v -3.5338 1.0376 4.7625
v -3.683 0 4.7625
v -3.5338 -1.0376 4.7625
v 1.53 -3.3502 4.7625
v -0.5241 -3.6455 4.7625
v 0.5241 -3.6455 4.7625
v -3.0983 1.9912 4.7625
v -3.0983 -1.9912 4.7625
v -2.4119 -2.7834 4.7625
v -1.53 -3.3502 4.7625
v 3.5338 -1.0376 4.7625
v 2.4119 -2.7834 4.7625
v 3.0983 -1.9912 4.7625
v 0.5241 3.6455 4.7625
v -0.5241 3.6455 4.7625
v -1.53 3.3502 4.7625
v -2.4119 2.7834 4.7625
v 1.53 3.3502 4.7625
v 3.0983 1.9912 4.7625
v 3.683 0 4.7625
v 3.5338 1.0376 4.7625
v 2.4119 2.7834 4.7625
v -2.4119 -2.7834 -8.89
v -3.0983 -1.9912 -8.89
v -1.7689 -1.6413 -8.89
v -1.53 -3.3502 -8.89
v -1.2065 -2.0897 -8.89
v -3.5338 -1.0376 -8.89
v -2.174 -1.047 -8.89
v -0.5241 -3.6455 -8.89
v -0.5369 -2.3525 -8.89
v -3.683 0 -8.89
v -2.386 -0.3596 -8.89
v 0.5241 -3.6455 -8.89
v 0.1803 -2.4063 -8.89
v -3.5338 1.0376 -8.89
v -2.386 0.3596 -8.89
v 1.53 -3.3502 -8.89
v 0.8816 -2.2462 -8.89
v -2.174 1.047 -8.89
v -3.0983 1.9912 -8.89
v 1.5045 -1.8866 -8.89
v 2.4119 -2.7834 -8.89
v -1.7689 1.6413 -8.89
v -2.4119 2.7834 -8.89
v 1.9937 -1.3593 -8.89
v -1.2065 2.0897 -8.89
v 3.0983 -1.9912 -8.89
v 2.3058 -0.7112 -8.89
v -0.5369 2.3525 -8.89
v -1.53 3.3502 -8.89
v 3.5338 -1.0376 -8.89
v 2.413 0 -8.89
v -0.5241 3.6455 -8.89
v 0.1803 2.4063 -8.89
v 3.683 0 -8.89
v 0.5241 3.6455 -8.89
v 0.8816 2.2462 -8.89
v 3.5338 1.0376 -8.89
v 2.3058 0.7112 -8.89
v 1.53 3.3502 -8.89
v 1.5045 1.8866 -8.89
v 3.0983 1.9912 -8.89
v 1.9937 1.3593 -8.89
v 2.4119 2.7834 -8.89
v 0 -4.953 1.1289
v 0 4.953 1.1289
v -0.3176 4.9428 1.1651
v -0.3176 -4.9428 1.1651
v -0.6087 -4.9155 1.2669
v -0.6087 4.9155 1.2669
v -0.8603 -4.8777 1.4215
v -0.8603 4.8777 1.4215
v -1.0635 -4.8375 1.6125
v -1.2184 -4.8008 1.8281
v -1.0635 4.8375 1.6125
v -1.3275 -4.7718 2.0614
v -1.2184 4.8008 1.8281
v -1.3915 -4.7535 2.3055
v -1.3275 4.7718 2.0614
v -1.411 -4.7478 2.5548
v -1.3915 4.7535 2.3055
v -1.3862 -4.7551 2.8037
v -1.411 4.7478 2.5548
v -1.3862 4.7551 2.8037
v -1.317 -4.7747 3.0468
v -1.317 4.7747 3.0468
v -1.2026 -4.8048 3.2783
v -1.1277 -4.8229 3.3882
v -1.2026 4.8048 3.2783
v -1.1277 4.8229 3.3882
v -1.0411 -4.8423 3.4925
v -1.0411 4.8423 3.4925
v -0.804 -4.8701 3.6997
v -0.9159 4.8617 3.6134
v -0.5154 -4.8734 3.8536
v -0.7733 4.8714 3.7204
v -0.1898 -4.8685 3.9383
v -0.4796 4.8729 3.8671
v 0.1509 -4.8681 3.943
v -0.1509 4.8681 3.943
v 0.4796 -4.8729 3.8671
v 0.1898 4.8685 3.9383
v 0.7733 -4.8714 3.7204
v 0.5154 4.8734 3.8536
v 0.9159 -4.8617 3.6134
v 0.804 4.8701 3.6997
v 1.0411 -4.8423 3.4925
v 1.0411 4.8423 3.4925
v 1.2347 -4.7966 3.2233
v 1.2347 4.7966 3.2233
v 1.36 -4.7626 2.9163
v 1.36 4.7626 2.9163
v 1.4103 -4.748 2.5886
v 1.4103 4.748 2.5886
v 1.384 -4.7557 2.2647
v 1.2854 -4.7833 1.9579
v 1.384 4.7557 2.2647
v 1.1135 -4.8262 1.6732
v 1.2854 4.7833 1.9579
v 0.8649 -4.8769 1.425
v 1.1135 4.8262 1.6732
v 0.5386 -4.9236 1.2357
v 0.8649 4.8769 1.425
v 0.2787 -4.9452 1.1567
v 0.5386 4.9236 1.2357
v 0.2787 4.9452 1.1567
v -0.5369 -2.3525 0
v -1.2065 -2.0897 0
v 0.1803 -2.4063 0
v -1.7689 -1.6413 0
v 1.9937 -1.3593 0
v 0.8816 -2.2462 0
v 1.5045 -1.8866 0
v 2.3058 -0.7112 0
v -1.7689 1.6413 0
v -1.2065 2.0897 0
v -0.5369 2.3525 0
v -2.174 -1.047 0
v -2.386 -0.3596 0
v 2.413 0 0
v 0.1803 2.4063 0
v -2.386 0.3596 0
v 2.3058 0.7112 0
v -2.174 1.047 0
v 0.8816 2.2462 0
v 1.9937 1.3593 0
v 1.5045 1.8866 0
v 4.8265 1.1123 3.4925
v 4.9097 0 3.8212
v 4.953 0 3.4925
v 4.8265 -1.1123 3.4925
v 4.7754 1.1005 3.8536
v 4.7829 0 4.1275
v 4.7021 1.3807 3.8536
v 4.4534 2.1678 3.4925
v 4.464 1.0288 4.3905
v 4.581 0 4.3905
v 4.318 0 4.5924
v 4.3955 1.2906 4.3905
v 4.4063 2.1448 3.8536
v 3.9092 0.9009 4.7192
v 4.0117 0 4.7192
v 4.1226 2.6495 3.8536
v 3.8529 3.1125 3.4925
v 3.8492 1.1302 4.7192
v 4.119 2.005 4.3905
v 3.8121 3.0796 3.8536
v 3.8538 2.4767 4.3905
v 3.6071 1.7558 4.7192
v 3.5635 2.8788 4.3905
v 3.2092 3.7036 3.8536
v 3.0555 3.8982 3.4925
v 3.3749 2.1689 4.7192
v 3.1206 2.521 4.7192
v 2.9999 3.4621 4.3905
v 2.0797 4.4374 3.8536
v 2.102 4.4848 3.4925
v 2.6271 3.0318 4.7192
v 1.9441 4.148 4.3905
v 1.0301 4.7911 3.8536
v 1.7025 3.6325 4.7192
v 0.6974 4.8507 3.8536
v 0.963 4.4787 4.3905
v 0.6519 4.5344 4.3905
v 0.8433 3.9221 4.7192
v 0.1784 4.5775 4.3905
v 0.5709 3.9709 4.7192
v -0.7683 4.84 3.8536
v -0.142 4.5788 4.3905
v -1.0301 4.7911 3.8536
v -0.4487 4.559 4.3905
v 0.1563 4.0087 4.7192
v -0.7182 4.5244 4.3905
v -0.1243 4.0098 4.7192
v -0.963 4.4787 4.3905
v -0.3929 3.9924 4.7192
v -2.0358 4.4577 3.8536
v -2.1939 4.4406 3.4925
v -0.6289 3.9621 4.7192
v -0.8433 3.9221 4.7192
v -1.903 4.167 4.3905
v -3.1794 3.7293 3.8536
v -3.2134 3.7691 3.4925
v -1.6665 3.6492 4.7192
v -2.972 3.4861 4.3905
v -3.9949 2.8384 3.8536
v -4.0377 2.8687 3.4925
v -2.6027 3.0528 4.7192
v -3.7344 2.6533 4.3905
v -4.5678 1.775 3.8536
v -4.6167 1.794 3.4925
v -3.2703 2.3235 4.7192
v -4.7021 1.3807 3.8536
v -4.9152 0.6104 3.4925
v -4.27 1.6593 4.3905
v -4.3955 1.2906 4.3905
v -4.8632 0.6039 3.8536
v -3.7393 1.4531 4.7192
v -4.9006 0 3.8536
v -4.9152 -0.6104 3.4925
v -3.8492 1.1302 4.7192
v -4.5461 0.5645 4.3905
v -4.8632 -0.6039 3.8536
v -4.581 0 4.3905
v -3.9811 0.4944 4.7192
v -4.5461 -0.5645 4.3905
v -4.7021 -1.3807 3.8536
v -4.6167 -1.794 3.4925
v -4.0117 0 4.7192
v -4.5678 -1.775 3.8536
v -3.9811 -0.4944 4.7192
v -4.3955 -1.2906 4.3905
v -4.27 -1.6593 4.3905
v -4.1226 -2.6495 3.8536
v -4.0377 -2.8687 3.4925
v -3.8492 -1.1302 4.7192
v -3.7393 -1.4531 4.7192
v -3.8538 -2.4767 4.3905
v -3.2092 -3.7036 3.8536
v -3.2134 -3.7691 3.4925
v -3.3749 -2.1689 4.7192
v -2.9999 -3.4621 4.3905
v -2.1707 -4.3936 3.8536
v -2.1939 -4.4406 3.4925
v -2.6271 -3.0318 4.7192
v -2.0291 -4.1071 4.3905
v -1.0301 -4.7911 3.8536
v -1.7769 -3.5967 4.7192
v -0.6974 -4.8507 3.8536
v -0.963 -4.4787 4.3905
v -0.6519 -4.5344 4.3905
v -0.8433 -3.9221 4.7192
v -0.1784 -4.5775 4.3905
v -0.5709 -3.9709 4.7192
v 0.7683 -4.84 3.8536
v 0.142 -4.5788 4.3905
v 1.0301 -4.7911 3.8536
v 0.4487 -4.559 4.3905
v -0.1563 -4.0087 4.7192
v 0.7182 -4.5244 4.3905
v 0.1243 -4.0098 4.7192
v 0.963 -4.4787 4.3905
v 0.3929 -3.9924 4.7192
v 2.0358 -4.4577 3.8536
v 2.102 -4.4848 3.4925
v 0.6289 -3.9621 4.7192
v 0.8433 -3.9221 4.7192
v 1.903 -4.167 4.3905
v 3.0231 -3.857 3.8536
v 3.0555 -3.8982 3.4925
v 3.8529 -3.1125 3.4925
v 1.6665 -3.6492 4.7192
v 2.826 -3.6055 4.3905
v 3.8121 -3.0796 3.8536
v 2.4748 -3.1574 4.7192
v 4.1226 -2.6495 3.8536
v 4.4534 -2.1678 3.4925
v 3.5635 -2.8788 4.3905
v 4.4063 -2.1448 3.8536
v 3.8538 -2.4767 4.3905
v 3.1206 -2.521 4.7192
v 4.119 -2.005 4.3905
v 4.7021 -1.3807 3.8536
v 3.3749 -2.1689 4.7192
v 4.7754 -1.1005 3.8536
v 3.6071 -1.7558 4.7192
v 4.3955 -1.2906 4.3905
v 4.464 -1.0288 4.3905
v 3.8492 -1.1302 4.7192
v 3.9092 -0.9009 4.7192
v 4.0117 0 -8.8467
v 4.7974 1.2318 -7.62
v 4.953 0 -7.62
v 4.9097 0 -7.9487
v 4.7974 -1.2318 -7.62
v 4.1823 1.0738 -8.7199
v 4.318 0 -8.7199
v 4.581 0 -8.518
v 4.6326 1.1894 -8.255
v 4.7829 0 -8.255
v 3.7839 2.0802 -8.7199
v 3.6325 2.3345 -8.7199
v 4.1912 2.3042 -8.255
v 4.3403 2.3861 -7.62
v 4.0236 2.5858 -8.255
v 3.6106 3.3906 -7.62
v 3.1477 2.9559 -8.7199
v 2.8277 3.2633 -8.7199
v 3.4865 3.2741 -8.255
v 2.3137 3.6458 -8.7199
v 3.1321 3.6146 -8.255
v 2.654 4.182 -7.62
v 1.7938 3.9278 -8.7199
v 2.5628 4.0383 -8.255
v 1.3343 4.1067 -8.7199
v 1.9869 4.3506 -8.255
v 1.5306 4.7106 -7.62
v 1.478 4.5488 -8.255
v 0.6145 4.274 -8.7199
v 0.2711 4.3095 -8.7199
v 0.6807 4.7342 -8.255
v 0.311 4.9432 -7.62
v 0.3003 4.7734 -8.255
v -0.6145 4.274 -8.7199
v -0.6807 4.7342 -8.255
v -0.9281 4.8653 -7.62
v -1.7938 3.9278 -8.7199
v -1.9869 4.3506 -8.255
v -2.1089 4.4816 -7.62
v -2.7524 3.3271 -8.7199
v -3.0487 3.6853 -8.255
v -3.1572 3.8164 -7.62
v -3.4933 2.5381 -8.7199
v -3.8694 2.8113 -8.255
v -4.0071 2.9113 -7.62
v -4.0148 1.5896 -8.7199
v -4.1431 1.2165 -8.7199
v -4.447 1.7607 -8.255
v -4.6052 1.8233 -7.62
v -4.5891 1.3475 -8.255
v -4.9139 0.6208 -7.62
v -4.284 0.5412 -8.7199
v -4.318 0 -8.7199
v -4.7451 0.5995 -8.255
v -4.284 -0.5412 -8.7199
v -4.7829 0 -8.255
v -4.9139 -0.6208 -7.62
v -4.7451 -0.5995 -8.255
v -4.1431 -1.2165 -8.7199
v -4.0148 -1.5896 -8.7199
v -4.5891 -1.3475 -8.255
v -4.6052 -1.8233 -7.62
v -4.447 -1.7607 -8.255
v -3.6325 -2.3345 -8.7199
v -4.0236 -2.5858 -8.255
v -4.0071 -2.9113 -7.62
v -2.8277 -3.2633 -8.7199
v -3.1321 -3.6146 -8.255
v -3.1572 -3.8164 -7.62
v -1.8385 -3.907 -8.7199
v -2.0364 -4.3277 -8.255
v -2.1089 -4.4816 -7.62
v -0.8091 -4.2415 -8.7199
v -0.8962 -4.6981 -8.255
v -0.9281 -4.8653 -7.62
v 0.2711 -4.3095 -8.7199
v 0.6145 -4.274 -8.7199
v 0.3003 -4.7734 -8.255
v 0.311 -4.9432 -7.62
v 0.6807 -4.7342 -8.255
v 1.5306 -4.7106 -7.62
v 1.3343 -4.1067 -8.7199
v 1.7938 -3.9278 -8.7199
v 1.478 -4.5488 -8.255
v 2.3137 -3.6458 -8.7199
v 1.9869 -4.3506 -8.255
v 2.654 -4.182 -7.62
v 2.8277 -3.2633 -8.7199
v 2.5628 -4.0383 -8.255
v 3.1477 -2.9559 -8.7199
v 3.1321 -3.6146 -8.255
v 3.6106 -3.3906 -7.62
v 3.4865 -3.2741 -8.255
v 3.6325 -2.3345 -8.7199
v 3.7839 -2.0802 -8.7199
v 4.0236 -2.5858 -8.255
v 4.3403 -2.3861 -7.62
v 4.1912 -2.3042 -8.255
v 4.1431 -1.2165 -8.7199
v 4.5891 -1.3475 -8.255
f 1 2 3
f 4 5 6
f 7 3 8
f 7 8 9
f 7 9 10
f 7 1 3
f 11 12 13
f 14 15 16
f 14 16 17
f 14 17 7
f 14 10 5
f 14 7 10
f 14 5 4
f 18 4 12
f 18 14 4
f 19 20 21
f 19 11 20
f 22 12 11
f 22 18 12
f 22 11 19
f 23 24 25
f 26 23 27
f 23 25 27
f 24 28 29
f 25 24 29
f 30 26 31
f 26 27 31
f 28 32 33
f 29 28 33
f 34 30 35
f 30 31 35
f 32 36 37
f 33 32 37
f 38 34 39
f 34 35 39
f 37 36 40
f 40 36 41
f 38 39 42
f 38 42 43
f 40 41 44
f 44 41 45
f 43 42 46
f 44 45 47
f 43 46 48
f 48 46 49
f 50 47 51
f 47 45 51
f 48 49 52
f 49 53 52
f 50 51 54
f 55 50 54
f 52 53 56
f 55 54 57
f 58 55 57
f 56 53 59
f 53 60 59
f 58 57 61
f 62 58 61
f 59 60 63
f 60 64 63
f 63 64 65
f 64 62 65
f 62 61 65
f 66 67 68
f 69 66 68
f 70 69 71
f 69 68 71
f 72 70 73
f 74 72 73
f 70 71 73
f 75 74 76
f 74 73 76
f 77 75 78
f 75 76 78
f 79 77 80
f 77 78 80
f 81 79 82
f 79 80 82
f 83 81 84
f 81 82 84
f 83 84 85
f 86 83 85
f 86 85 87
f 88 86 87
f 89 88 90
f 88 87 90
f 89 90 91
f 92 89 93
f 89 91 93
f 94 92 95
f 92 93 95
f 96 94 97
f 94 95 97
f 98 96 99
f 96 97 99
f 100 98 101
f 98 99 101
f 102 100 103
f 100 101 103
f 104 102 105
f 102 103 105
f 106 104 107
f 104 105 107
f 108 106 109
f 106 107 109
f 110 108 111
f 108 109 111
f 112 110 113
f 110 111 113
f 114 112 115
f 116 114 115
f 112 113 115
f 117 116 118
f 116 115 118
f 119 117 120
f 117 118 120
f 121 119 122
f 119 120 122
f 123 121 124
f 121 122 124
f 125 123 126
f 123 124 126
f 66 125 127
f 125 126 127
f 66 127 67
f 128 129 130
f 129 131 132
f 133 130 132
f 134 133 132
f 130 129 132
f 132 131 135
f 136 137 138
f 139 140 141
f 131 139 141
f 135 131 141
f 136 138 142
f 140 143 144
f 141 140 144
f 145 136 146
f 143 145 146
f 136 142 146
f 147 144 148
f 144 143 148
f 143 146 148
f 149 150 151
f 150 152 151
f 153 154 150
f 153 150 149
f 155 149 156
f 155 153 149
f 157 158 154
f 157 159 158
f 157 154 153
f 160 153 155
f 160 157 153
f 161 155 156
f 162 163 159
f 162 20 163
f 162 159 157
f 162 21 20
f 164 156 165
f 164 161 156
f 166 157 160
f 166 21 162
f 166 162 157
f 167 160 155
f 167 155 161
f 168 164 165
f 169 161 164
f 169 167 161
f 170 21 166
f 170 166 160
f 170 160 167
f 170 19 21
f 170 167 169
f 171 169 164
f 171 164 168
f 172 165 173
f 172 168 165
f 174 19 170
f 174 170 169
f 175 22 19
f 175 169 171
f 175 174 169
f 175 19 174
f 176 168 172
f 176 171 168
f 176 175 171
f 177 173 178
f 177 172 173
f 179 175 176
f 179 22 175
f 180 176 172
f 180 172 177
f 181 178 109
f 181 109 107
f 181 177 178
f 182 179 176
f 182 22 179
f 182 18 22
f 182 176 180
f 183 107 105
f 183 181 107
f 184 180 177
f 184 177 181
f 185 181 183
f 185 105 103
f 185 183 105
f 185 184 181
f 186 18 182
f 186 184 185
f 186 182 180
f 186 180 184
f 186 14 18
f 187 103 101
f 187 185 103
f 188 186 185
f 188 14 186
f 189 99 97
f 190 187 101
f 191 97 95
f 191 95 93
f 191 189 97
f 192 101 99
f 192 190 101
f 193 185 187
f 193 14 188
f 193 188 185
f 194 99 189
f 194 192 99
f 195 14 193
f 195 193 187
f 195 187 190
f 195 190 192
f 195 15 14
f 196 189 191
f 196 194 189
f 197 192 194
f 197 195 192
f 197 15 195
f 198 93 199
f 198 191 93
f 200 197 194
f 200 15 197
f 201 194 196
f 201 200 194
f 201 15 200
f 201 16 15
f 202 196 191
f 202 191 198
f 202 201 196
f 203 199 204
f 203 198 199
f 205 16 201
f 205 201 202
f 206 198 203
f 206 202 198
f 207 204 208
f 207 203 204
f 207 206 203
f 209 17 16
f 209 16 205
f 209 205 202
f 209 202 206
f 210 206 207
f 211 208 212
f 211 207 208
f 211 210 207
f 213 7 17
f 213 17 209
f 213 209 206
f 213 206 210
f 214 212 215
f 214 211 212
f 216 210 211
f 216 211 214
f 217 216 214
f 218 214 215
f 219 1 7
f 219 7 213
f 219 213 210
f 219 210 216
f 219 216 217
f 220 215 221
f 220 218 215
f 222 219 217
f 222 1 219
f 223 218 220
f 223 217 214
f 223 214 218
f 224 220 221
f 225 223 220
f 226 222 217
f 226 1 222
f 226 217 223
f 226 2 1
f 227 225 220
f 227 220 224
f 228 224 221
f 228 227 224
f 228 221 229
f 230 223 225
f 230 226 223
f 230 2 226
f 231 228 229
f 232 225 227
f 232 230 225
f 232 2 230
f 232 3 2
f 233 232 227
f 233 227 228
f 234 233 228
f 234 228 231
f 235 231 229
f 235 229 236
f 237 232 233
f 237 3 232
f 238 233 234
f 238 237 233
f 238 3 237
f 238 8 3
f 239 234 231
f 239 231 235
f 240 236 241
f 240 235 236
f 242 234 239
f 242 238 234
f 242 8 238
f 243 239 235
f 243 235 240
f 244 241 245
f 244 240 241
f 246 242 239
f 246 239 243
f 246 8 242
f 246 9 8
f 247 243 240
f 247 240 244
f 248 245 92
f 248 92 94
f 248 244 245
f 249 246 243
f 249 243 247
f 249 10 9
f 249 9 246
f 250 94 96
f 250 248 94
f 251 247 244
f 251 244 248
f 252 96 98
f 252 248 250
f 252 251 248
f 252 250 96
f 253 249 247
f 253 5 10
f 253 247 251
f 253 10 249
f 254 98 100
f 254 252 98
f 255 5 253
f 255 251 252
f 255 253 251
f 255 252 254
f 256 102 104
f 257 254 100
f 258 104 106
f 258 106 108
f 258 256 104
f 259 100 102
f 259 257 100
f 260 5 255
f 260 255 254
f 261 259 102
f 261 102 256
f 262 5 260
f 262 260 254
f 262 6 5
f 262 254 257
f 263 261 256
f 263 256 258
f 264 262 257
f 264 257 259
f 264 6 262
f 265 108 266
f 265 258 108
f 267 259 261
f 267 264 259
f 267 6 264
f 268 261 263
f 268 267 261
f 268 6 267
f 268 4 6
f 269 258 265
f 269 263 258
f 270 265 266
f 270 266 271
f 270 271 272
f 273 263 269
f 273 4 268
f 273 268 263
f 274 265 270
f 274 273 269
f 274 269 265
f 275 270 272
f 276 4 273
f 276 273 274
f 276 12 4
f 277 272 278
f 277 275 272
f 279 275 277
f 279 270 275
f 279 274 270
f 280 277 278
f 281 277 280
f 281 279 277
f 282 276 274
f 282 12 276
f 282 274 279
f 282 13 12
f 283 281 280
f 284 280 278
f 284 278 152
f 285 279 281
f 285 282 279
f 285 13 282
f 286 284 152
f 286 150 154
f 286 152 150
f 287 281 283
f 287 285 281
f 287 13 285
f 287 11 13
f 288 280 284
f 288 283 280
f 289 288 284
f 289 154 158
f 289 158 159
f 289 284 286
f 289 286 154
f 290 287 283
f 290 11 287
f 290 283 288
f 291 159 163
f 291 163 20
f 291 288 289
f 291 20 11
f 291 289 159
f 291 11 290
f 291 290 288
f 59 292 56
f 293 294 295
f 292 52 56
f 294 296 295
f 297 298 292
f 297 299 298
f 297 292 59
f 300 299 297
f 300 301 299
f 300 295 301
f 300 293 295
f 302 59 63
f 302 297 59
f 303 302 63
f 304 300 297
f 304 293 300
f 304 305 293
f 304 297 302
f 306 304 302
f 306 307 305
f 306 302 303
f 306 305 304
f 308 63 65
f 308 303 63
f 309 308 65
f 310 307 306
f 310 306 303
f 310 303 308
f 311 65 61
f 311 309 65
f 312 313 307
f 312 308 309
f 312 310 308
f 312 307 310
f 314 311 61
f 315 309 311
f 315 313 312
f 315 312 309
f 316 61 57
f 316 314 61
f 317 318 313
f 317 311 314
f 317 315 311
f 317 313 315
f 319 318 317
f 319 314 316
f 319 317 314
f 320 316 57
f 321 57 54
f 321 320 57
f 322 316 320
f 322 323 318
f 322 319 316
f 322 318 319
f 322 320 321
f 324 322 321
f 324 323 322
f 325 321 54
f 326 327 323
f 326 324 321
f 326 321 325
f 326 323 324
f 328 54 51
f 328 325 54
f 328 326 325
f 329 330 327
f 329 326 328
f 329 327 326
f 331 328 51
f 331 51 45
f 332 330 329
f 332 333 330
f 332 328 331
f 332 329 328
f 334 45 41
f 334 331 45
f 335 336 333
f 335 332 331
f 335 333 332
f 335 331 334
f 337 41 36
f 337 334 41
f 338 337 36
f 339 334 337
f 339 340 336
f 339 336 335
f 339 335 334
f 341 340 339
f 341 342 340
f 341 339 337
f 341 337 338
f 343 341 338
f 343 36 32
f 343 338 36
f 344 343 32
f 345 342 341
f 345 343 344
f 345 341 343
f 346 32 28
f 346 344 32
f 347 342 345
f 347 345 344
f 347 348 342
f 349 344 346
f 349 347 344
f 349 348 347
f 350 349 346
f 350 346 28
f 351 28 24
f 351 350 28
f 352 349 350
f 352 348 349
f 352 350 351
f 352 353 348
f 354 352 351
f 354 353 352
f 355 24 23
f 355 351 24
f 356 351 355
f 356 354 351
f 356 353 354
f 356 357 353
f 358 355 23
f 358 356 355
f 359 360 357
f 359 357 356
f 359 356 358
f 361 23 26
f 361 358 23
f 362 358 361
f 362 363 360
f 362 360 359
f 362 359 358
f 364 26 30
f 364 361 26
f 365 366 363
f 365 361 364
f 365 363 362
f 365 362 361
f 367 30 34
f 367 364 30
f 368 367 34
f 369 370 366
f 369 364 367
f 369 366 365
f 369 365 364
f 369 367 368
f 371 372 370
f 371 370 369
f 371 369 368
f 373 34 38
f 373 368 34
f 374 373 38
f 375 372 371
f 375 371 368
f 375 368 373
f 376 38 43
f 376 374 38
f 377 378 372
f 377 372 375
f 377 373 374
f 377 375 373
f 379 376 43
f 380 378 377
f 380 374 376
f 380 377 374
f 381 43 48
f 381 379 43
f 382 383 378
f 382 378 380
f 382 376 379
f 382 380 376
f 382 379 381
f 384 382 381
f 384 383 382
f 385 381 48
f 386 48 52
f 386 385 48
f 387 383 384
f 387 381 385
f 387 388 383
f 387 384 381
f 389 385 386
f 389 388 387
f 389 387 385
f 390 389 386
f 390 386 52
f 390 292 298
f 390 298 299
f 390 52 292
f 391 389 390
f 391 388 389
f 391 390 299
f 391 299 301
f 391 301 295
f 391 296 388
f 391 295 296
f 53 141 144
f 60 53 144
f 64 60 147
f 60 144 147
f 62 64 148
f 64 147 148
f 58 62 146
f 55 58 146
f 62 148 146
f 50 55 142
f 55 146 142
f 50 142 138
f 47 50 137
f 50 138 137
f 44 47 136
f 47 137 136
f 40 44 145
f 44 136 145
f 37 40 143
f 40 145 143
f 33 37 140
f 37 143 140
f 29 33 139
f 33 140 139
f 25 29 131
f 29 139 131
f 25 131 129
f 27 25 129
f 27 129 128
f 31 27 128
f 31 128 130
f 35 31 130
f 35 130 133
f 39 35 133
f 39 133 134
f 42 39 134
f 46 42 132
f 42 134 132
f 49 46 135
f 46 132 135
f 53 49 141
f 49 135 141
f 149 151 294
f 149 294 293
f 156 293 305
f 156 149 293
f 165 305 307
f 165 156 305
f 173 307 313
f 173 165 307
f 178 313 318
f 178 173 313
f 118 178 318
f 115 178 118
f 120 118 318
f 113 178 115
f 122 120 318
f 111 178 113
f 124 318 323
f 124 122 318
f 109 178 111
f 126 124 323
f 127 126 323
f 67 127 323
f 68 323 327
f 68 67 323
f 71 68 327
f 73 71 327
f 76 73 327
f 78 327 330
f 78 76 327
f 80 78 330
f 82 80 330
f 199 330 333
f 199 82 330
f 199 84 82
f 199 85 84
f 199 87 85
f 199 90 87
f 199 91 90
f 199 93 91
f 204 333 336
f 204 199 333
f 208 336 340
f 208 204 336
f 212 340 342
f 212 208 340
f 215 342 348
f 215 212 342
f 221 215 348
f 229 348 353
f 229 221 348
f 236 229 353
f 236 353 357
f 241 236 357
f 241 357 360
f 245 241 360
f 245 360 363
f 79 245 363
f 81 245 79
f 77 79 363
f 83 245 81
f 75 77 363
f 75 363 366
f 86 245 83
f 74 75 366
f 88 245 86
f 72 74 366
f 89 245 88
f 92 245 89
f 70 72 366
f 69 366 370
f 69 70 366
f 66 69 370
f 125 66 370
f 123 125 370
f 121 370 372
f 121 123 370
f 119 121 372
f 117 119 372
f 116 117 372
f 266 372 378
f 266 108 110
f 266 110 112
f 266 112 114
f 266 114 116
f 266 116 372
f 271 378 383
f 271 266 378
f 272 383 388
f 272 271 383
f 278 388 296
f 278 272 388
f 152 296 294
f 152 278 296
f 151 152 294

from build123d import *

# Parameters (mm, degrees)
SKETCH2_R                           = 4.953
SKETCH2_R_2                         = 2.413
BOSS_EXTRUDE1_DEPTH                 = 8.89
BOSS_EXTRUDE2_START                 = 4.7625
SKETCH2_2_R                         = 4.953
SKETCH2_2_R_2                       = 2.413
SKETCH2_2_R_3                       = 1.9939
BOSS_EXTRUDE2_DEPTH                 = 4.7625
CUT_EXTRUDE1_REACH                  = 13.318
CUT_EXTRUDE1_END_RADIUS             = 4.953
SKETCH8_R                           = 1.411111111
CUT_EXTRUDE1_DIRECTION_2_REACH      = 13.318
CUT_EXTRUDE1_DIRECTION_2_END_RADIUS = 4.953
FILLET2_R                           = 1.27


with BuildPart() as part:
    # Sketch2 → Boss-Extrude1 (new body)
    with BuildSketch(Plane.XY):
        Circle(SKETCH2_R)
        Circle(SKETCH2_R_2, mode=Mode.SUBTRACT)
    extrude(amount=-BOSS_EXTRUDE1_DEPTH)

    # Sketch2<2> → Boss-Extrude2 (add)
    # profile 1 of 3: a face of its own
    with BuildSketch(Plane.XY.offset(BOSS_EXTRUDE2_START)):
        Circle(SKETCH2_2_R)
        Circle(SKETCH2_2_R_2, mode=Mode.SUBTRACT)
    # profile 2 of 3: a face of its own
    with BuildSketch(Plane.XY.offset(BOSS_EXTRUDE2_START)):
        Circle(SKETCH2_2_R_2)
        Circle(SKETCH2_2_R_3, mode=Mode.SUBTRACT)
    # profile 3 of 3: a face of its own
    with BuildSketch(Plane.XY.offset(BOSS_EXTRUDE2_START)):
        Circle(SKETCH2_2_R_3)
    extrude(amount=-BOSS_EXTRUDE2_DEPTH)

    # Cut-Extrude1: up to this cylinder (the profile starts inside it)
    cut_extrude1_end = Plane(origin=(0, 0, 2.54), z_dir=(0, 0, 1)) * Cylinder(CUT_EXTRUDE1_END_RADIUS, 37.542, mode=Mode.PRIVATE)
    # Sketch8 → Cut-Extrude1 (cut, up to the surface)
    with BuildSketch(Plane(origin=(0, 0, 0), x_dir=(1, 0, 0), z_dir=(0, 1, 0)), mode=Mode.PRIVATE) as cut_extrude1_sk1:
        with Locations(Location((0, -2.54, 0), (0, 0, 90))):
            Circle(SKETCH8_R)
    cut_extrude1_tool1 = extrude(cut_extrude1_sk1.sketch, amount=-CUT_EXTRUDE1_REACH, mode=Mode.PRIVATE) & cut_extrude1_end
    add(cut_extrude1_tool1.solids().sort_by_distance((0, 0, 2.54))[0], mode=Mode.SUBTRACT)

    # Cut-Extrude1 direction 2: up to this cylinder (the profile starts inside it)
    cut_extrude1_direction_2_end = Plane(origin=(0, 0, 2.54), z_dir=(0, 0, 1)) * Cylinder(CUT_EXTRUDE1_DIRECTION_2_END_RADIUS, 37.542, mode=Mode.PRIVATE)
    # Sketch8 → Cut-Extrude1 direction 2 (cut, up to the surface)
    with BuildSketch(Plane(origin=(0, 0, 0), x_dir=(1, 0, 0), z_dir=(0, 1, 0)), mode=Mode.PRIVATE) as cut_extrude1_direction_2_sk1:
        with Locations(Location((0, -2.54, 0), (0, 0, 90))):
            Circle(SKETCH8_R)
    cut_extrude1_direction_2_tool1 = extrude(cut_extrude1_direction_2_sk1.sketch, amount=CUT_EXTRUDE1_DIRECTION_2_REACH, mode=Mode.PRIVATE) & cut_extrude1_direction_2_end
    add(cut_extrude1_direction_2_tool1.solids().sort_by_distance((0, 0, 2.54))[0], mode=Mode.SUBTRACT)

    # Fillet2
    # the kernel refuses this fillet: 1.27 mm, written as the material it takes off along each edge
    with BuildSketch(Plane(origin=(0, 0, -8.89), x_dir=(1, 0, 0), z_dir=(0, -1, 0))) as fillet2_piece_1:
        with BuildLine():
            CenterArc((4.953 - FILLET2_R, FILLET2_R), FILLET2_R, 270, 90)
            Line((4.953 - FILLET2_R, 0), (4.953, 0))
            Line((4.953, 0), (4.953, FILLET2_R))
        make_face()
    revolve(axis=Axis((0, 0, -8.89), (0, 0, 1)), mode=Mode.SUBTRACT)
    with BuildSketch(Plane(origin=(0, 0, 4.7625), x_dir=(1, 0, 0), z_dir=(0, -1, 0))) as fillet2_piece_2:
        with BuildLine():
            CenterArc((4.953 - FILLET2_R, -FILLET2_R), FILLET2_R, 0, 90)
            Line((4.953 - FILLET2_R, 0), (4.953, 0))
            Line((4.953, 0), (4.953, -FILLET2_R))
        make_face()
    revolve(axis=Axis((0, 0, 4.7625), (0, 0, 1)), mode=Mode.SUBTRACT)


solid = part.part
